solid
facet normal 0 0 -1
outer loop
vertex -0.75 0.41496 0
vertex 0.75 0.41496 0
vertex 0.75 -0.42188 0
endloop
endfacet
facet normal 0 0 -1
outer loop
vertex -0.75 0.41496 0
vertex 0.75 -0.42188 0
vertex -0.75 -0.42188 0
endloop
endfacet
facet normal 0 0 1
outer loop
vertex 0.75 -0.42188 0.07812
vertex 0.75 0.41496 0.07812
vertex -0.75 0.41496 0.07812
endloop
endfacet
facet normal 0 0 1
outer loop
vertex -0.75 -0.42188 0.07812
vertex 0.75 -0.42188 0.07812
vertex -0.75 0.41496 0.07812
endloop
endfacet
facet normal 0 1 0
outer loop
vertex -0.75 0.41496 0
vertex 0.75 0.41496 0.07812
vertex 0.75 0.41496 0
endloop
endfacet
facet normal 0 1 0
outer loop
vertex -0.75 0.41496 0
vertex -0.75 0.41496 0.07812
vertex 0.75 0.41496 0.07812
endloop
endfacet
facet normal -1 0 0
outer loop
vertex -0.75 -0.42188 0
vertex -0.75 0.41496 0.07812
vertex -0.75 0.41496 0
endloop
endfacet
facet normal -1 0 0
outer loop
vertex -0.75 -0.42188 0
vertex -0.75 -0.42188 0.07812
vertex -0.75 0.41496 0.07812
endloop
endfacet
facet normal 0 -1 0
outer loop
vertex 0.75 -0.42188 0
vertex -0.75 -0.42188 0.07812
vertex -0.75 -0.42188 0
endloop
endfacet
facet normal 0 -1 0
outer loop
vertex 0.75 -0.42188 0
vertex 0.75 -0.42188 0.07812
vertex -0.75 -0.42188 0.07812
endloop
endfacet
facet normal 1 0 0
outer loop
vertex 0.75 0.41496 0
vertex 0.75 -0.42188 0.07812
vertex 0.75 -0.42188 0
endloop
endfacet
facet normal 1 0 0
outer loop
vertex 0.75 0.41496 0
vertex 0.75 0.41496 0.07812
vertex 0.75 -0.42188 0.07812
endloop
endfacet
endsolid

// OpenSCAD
translate([-0.75, -0.421875, 0.0])
rotate([0, 0, 0])
linear_extrude(height=0.078125)
    polygon(points=[[1.5, 0.0], [1.5, 0.8368421052631579], [0.0, 0.8368421052631579], [0.0, 0.0]]);
